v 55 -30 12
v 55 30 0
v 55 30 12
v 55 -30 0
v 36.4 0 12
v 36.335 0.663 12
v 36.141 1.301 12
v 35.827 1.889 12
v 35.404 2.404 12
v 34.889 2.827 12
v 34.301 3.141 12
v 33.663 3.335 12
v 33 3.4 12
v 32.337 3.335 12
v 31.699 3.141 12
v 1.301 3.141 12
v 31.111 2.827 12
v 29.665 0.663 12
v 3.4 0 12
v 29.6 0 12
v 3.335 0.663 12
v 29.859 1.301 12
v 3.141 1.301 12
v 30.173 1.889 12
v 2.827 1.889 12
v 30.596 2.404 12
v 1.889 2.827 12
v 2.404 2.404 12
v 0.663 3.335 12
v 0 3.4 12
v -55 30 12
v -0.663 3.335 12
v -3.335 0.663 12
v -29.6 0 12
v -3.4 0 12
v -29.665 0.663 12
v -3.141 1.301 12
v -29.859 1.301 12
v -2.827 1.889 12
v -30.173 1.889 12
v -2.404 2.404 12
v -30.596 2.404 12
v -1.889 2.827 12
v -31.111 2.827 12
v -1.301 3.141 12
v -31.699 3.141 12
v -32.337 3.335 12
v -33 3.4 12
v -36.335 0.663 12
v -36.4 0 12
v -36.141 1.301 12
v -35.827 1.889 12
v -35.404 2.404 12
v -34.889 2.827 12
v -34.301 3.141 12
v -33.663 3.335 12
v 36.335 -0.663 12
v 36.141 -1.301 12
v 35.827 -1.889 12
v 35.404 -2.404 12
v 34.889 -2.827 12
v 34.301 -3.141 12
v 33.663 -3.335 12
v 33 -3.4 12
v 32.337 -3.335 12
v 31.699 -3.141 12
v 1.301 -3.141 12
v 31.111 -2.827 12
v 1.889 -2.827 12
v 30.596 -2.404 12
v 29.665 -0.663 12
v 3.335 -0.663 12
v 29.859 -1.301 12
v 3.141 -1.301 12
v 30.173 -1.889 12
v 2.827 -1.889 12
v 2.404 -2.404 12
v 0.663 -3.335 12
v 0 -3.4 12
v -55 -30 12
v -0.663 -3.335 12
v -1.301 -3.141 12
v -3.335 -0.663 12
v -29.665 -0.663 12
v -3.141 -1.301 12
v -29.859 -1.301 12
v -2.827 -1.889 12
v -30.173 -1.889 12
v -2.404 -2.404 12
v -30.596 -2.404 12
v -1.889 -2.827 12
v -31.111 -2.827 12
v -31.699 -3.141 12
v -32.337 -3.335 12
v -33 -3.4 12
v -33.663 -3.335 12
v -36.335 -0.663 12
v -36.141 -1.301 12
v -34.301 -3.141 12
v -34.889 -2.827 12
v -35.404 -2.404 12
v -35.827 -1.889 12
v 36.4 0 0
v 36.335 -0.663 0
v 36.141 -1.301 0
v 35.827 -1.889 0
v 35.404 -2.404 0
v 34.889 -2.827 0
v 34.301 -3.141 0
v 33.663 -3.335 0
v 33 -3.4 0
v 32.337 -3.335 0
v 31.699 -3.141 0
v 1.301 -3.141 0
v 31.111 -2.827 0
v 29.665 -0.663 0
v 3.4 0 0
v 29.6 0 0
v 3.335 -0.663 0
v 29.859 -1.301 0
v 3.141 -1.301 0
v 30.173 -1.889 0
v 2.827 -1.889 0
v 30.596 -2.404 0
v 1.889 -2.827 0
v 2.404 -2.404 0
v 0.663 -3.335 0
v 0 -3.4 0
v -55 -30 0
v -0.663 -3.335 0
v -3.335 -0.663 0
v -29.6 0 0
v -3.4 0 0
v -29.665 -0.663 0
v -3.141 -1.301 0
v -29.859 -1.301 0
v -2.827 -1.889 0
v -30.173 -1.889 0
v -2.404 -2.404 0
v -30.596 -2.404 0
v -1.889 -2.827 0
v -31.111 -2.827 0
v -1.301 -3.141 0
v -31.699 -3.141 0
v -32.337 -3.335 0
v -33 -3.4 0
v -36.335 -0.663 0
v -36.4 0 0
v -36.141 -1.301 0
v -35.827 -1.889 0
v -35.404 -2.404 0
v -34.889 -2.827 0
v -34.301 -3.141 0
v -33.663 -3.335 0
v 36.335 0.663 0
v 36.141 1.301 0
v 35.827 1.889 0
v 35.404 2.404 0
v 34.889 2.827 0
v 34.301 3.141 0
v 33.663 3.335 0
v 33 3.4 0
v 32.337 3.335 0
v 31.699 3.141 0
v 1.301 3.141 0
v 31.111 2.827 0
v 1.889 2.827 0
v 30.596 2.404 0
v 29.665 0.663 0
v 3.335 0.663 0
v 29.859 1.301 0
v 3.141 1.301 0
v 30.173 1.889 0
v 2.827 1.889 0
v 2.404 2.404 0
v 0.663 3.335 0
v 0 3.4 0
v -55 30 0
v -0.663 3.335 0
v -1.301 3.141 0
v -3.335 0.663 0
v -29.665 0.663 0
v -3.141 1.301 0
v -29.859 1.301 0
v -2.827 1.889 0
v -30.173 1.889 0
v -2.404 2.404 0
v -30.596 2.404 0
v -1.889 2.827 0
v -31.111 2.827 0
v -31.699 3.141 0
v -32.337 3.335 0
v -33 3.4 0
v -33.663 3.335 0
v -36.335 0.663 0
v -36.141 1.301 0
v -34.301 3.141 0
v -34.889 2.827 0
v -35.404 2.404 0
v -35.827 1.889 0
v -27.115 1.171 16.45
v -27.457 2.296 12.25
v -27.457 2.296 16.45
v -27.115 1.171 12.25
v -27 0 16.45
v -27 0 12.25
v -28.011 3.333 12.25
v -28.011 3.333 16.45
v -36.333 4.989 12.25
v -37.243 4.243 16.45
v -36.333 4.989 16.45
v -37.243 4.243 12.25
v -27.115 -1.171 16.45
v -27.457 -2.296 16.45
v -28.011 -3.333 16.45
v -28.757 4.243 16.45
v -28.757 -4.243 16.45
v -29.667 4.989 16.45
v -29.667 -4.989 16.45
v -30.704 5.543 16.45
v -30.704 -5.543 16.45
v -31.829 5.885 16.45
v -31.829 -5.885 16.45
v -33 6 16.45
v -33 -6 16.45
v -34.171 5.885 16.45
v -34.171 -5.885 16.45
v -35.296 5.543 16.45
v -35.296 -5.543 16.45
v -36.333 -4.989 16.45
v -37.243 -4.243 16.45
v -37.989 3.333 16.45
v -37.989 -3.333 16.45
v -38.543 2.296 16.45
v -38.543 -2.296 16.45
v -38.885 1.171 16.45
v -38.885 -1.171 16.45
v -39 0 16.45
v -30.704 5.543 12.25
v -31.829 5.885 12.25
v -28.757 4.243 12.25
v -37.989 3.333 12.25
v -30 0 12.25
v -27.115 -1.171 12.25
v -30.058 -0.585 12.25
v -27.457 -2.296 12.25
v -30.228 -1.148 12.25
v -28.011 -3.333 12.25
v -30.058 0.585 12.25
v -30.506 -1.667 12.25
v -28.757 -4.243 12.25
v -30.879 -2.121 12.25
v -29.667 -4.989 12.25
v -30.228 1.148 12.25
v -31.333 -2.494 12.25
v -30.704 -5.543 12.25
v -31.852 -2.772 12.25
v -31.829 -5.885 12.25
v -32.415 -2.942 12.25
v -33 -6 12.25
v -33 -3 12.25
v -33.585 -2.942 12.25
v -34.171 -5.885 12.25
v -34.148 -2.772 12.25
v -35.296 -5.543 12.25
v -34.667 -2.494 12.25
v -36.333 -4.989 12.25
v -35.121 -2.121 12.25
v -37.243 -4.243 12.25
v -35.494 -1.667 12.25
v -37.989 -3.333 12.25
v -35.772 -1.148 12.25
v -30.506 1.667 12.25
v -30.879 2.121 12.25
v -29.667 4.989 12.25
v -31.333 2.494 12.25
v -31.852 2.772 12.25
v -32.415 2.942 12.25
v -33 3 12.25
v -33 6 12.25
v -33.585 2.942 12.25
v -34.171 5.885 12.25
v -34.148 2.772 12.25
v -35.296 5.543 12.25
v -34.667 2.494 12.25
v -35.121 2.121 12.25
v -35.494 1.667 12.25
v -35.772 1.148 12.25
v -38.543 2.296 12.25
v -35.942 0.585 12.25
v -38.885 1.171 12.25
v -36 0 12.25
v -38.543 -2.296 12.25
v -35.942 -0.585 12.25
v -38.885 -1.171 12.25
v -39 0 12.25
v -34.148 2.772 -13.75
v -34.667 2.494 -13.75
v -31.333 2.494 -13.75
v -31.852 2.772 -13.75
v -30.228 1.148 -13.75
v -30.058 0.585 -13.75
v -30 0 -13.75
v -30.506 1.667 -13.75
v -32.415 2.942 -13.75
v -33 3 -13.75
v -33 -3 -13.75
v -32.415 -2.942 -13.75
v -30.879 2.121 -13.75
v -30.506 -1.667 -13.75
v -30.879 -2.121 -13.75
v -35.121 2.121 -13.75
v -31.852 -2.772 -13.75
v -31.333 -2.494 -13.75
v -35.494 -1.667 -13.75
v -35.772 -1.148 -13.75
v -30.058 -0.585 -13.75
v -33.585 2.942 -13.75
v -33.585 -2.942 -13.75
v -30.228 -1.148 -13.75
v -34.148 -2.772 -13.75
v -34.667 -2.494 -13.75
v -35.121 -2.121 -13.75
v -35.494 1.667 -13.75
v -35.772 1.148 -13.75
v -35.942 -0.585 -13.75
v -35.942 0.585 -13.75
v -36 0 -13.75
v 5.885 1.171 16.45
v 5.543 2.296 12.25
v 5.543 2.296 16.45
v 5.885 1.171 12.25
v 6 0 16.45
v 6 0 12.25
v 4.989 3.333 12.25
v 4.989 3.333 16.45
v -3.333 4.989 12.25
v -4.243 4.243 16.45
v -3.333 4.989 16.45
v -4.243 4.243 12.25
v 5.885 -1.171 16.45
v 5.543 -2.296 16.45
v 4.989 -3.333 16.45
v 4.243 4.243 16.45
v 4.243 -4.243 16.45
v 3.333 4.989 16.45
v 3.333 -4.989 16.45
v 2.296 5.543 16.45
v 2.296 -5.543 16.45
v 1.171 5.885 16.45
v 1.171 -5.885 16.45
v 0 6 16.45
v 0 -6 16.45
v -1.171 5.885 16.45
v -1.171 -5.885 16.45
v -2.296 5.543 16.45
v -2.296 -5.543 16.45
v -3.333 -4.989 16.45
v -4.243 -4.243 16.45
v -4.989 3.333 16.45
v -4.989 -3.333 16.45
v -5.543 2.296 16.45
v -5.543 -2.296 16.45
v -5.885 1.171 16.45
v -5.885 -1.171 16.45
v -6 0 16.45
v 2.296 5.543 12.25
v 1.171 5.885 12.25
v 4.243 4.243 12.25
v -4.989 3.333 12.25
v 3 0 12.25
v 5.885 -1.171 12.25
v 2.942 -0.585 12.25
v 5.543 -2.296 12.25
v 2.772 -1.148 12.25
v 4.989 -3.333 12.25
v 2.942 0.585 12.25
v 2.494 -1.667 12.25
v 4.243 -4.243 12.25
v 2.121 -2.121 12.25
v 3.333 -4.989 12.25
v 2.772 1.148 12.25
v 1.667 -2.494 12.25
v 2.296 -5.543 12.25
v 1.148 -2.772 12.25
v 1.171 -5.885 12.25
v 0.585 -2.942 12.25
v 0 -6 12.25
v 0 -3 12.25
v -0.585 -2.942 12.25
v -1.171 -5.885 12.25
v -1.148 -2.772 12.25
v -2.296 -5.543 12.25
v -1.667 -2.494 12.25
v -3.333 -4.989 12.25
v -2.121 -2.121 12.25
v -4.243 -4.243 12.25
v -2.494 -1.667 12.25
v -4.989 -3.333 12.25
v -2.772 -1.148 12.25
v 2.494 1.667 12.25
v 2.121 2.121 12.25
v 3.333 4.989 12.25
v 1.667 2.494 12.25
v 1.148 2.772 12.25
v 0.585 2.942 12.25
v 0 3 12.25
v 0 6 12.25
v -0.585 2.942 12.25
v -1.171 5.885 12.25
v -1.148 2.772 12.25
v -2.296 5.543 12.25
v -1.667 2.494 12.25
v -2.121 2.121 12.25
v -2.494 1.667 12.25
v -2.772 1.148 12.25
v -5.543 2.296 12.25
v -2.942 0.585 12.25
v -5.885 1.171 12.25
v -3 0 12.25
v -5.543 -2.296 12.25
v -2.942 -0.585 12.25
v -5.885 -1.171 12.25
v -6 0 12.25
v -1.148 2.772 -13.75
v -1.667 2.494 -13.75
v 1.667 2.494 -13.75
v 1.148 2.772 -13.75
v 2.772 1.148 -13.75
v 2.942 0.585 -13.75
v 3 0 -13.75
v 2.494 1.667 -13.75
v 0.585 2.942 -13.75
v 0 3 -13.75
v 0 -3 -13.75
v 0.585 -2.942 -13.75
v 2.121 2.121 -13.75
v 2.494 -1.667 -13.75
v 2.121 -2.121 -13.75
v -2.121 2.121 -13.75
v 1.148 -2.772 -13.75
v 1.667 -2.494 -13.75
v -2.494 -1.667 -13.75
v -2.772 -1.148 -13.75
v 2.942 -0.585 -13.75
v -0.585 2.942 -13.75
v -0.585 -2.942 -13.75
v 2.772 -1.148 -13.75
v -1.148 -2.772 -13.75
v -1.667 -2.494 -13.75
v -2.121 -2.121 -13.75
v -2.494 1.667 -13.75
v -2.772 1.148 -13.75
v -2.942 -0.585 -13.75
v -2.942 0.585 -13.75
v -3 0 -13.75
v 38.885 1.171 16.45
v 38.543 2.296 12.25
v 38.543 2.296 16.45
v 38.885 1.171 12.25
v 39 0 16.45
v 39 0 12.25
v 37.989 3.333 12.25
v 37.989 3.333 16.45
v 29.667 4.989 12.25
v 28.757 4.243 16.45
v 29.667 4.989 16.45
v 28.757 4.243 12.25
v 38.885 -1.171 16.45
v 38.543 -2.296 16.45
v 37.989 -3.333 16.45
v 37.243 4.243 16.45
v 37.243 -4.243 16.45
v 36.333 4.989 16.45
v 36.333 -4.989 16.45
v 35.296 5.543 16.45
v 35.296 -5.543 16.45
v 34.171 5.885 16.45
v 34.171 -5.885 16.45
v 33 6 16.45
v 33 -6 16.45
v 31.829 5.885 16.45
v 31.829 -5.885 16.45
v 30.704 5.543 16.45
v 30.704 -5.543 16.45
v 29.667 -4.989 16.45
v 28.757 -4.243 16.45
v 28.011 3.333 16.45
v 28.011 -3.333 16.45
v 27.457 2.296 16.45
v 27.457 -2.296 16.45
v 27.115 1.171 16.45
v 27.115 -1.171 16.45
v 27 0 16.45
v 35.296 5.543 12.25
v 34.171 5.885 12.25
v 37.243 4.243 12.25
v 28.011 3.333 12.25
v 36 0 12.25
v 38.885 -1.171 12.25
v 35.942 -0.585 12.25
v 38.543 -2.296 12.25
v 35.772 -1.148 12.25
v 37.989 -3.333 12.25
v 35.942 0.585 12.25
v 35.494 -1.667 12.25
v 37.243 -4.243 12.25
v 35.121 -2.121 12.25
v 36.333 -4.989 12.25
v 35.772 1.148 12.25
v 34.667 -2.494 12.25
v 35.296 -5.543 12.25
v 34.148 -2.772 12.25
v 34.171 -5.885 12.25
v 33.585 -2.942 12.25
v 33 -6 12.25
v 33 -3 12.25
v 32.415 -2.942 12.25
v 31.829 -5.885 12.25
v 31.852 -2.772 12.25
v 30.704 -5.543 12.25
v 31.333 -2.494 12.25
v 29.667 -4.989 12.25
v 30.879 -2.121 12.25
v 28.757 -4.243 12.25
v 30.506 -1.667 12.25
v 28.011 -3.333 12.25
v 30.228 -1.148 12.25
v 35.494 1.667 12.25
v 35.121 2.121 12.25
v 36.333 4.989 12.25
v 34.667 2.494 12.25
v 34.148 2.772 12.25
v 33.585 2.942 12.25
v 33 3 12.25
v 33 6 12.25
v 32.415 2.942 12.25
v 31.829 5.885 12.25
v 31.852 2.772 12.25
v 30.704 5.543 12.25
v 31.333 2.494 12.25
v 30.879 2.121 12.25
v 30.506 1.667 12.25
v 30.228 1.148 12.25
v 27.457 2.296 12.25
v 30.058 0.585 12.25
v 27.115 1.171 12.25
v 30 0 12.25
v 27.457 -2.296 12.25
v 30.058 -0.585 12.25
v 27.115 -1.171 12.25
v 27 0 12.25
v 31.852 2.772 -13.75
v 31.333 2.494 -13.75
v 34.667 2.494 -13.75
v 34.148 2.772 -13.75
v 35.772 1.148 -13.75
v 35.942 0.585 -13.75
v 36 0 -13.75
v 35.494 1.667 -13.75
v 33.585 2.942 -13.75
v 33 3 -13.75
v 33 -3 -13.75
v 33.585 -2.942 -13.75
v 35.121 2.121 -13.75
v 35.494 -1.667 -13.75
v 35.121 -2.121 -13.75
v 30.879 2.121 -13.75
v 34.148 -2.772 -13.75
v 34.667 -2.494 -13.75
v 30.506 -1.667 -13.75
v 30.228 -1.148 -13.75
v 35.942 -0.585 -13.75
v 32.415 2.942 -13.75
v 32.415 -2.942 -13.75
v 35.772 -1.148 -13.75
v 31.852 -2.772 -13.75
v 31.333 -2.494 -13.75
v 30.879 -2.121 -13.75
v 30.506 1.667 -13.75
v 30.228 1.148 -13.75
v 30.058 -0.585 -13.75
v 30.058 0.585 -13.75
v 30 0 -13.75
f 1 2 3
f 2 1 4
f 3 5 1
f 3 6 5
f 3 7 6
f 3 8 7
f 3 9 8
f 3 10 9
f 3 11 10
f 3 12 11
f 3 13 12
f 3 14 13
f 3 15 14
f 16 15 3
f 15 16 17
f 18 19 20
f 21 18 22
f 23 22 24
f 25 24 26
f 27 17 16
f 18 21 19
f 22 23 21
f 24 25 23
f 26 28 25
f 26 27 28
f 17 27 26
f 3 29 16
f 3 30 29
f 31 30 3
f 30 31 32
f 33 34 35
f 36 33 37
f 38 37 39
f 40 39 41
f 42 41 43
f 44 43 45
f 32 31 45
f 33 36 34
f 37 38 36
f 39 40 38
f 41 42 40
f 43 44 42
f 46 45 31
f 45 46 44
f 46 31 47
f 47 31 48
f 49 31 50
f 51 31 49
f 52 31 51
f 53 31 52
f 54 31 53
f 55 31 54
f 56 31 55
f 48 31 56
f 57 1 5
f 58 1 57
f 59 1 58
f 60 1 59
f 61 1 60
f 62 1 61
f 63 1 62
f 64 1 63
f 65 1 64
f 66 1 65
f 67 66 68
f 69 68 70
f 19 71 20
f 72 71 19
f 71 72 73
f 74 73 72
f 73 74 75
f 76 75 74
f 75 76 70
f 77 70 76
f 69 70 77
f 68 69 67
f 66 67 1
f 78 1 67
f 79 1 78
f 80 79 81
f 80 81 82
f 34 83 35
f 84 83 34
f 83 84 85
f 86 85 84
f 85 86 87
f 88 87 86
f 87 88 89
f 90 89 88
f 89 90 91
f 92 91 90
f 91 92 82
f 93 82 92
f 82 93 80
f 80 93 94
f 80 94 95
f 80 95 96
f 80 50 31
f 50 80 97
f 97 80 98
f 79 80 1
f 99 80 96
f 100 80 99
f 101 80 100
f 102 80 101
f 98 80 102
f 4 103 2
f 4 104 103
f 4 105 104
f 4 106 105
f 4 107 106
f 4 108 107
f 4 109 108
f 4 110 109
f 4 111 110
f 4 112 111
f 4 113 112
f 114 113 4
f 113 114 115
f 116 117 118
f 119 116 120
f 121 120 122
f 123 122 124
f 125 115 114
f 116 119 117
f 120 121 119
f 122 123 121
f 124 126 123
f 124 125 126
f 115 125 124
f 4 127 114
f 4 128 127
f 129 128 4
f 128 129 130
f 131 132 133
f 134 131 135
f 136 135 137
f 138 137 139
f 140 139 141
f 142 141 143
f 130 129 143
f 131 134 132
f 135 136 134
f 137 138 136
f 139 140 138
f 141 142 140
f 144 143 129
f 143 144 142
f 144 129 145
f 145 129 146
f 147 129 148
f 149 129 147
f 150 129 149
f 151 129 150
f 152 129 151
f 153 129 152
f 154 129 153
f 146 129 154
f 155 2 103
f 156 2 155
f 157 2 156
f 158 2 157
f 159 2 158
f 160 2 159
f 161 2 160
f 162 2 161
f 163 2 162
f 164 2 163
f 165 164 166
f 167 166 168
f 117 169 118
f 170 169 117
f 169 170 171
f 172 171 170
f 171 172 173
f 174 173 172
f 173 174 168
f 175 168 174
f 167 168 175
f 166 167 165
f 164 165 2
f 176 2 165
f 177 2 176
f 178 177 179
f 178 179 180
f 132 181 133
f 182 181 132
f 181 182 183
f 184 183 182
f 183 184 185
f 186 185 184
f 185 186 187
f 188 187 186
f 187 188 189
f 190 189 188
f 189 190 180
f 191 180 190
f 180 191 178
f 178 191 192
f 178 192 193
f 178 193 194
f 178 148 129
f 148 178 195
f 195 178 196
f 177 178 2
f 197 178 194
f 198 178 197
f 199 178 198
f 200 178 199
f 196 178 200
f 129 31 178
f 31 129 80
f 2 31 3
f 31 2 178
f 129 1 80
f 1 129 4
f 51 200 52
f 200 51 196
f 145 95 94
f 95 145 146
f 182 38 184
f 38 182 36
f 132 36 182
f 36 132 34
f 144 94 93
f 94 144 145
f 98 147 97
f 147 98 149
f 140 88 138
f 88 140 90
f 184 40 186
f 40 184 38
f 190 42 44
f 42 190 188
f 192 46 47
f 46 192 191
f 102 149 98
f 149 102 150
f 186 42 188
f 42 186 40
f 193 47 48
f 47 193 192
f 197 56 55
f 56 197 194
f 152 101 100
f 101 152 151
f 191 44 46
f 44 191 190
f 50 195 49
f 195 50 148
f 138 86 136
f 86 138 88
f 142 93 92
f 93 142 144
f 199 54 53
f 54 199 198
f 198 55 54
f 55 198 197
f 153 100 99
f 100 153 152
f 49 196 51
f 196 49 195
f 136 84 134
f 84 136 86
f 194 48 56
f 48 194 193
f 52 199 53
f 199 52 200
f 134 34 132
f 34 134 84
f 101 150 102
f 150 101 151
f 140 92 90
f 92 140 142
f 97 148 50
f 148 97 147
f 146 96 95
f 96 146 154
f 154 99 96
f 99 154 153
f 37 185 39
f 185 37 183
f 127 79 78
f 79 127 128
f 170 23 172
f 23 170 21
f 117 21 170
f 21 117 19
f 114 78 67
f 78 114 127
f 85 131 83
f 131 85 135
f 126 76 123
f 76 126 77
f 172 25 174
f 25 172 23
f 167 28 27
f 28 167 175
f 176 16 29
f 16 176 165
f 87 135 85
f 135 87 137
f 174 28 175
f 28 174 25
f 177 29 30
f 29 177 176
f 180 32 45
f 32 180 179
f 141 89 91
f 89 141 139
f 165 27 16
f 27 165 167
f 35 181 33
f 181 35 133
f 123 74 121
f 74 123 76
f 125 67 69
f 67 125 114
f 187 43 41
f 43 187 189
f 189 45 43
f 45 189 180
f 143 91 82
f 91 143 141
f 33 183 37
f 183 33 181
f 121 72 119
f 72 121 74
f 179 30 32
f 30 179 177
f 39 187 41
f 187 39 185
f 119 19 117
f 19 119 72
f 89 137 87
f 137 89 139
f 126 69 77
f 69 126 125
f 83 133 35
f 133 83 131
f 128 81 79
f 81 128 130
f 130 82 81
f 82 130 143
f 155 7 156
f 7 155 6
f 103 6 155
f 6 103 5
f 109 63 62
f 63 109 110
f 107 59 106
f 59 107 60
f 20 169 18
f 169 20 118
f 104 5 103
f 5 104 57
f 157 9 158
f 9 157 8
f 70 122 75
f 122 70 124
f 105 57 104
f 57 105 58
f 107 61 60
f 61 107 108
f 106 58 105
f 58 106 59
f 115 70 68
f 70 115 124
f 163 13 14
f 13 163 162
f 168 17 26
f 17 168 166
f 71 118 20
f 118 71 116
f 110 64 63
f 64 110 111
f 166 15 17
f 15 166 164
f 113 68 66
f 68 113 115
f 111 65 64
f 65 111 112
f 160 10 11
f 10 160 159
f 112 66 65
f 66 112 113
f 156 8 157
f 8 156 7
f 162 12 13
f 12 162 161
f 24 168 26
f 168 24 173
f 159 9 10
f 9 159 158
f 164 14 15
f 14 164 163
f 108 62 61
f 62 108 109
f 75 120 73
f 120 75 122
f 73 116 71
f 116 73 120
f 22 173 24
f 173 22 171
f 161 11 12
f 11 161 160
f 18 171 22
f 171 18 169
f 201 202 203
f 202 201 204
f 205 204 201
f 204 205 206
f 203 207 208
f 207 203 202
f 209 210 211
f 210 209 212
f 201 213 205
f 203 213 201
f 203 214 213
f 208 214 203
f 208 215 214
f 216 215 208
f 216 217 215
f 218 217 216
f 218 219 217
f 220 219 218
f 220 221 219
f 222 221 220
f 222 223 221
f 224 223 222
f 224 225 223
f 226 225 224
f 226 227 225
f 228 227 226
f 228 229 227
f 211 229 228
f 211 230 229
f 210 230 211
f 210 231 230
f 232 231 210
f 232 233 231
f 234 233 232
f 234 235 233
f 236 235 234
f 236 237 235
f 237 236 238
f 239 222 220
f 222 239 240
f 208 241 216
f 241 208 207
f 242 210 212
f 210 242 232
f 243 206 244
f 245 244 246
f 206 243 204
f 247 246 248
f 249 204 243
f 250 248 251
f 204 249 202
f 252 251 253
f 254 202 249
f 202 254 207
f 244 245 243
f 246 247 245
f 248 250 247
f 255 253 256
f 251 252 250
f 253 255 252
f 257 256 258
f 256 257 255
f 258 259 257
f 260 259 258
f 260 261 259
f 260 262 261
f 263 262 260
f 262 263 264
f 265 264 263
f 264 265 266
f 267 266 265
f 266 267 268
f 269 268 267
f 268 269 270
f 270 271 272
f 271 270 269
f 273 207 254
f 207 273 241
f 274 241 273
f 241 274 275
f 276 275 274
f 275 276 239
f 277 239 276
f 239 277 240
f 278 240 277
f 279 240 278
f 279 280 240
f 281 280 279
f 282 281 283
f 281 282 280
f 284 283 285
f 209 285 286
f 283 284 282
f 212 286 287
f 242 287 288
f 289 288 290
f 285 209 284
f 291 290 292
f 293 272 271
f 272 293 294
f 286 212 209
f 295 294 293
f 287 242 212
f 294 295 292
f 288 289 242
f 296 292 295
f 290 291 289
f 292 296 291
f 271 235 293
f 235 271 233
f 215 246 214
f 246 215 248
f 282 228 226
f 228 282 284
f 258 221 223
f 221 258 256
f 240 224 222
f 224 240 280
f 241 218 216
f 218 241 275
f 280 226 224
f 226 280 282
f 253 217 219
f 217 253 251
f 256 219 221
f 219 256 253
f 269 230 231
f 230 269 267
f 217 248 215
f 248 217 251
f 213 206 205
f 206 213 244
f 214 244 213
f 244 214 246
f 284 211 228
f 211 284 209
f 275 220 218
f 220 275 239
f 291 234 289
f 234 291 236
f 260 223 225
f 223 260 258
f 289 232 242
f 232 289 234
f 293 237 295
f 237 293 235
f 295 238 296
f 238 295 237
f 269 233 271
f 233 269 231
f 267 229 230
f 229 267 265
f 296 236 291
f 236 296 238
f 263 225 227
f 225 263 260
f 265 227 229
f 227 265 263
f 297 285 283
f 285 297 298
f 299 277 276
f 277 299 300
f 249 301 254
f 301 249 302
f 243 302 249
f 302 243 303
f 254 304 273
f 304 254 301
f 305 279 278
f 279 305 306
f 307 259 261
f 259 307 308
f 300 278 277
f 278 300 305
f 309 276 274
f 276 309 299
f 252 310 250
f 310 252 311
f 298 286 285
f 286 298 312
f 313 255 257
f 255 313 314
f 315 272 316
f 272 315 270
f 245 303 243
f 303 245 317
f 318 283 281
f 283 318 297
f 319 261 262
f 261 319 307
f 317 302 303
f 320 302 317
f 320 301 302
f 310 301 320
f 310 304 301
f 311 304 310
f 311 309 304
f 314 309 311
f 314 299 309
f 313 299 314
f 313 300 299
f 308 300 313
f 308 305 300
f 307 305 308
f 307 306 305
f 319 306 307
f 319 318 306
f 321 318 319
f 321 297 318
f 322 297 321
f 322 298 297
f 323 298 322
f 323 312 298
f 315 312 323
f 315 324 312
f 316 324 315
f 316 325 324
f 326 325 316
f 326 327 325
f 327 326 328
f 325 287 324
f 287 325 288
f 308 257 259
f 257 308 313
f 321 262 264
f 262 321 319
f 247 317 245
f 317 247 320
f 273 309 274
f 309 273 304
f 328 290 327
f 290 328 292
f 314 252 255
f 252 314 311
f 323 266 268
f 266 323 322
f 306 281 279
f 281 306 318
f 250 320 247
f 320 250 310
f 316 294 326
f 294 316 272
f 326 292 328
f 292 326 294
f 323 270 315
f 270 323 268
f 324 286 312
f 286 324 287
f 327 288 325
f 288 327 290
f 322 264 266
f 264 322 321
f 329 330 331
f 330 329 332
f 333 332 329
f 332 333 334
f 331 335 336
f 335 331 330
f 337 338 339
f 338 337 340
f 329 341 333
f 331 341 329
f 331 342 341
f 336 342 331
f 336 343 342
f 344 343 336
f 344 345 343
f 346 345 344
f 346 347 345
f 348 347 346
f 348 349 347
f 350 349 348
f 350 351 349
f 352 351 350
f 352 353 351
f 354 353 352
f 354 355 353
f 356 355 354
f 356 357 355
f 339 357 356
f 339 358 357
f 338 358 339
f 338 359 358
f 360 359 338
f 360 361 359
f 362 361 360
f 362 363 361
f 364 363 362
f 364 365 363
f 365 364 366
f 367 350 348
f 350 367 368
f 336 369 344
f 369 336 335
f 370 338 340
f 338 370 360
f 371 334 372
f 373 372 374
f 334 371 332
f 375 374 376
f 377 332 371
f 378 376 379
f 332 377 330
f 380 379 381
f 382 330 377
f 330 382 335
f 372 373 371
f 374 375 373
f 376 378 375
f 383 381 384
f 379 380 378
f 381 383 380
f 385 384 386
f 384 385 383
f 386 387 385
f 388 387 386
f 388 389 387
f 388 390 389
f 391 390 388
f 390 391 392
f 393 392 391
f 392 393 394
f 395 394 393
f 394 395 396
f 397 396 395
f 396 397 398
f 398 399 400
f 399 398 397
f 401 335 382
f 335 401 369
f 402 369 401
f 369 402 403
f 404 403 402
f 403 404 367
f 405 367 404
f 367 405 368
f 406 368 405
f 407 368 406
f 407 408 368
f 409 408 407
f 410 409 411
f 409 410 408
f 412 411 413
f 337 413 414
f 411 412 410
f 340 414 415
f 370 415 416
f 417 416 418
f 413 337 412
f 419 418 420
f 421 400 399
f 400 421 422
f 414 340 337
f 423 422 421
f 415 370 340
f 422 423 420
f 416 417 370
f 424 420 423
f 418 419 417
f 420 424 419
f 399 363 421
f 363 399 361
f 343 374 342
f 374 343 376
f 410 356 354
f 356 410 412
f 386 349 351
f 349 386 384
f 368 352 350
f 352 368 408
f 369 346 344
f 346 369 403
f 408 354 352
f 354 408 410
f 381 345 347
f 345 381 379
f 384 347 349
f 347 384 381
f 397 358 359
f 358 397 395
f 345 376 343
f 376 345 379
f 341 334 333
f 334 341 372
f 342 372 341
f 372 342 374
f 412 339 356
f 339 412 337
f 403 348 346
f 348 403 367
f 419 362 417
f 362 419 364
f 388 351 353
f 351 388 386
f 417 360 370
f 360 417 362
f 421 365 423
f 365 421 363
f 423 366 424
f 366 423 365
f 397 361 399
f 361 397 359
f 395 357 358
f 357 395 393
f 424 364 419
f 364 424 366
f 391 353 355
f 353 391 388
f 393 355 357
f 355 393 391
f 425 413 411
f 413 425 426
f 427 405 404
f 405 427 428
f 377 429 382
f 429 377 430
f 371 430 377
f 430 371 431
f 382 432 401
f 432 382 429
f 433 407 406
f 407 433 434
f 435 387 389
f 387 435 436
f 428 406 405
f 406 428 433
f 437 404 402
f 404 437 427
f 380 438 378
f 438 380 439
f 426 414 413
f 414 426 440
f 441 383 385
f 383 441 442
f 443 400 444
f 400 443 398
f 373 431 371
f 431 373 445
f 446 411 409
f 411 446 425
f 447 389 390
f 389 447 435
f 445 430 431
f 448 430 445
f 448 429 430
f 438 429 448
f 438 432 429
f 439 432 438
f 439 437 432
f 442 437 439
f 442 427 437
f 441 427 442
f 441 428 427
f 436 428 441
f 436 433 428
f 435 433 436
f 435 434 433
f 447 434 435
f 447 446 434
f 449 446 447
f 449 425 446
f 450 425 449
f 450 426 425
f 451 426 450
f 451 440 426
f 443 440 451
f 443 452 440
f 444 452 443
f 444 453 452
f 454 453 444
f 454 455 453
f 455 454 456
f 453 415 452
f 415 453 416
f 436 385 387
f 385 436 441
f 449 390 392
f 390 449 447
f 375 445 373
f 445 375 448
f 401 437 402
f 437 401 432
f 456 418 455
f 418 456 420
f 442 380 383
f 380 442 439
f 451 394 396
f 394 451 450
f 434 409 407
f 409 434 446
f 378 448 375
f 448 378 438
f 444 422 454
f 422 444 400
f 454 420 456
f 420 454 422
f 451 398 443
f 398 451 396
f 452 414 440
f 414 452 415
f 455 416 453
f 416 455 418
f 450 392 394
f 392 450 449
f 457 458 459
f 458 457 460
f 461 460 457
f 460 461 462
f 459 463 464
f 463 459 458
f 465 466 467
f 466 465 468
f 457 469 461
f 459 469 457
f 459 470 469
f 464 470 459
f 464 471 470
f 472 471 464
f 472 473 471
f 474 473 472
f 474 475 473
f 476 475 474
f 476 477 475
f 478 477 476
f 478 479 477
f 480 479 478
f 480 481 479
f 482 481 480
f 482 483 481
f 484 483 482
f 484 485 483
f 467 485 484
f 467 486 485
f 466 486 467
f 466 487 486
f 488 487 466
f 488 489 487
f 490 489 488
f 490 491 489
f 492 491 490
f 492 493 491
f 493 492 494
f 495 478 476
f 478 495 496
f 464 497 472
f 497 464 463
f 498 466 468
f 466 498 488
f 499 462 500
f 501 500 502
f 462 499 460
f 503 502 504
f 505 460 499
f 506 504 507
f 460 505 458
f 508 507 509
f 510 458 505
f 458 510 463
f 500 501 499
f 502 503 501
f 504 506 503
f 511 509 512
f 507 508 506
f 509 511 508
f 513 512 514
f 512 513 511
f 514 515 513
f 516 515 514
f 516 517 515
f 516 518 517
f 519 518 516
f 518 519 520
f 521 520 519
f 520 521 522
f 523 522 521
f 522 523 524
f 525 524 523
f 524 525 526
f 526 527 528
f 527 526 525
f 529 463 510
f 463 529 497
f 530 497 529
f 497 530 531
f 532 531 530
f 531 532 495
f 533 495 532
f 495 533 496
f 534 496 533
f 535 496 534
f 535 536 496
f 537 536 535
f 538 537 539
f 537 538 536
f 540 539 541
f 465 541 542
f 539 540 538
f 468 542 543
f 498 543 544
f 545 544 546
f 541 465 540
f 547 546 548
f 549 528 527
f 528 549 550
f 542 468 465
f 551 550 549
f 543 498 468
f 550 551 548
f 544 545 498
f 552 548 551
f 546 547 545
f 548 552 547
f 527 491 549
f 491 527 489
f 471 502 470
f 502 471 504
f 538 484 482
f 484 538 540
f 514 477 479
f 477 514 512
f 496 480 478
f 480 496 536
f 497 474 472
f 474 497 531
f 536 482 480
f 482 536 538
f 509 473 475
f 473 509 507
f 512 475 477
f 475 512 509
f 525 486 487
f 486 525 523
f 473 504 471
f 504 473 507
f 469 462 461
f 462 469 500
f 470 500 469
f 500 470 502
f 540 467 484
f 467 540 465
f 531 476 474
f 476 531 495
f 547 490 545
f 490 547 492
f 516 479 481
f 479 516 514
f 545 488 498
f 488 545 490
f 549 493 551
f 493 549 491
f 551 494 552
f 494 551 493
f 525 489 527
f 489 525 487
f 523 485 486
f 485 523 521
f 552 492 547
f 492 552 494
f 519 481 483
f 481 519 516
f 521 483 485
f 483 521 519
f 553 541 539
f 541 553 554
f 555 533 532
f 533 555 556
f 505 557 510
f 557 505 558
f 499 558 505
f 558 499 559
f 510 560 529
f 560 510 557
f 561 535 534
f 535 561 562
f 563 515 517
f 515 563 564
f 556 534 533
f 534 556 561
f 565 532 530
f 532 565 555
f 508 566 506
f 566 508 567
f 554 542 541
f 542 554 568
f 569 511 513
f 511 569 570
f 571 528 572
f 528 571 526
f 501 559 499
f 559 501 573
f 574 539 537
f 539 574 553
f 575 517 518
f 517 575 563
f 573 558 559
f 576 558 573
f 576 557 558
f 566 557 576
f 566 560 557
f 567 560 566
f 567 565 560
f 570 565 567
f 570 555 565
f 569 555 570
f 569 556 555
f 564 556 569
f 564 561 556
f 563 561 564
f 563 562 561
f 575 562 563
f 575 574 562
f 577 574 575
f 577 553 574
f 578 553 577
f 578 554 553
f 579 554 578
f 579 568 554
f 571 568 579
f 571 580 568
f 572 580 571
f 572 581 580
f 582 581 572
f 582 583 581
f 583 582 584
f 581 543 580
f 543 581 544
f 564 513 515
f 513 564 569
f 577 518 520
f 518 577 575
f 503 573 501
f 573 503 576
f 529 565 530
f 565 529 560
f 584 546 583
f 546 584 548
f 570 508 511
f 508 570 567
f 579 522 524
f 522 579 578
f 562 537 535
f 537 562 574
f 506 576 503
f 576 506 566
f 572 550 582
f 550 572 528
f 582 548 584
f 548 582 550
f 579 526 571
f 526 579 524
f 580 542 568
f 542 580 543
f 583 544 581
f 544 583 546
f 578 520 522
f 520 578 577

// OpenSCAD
$fn = 32;

// ------------------------------------------------------------------------
// Bolted plate: 110 x 60 x 12 mm plate, 3 fasteners
// Every part is its own module, assembly() places them once.
// ------------------------------------------------------------------------

// --- part 1 ---
module plate() {
  difference() {
    translate([-55, -30, 0]) cube([110, 60, 12]);
    translate([-33, 0, -1]) cylinder(h = 14, d = 6.8);
    translate([0, 0, -1]) cylinder(h = 14, d = 6.8);
    translate([33, 0, -1]) cylinder(h = 14, d = 6.8);
  }
}

// --- part 2 ---
module bolt1() {
  cylinder(h = 4.2, d = 12);
  translate([0, 0, -26]) cylinder(h = 26, d = 6);
}

// --- part 3 ---
module bolt2() {
  cylinder(h = 4.2, d = 12);
  translate([0, 0, -26]) cylinder(h = 26, d = 6);
}

// --- part 4 ---
module bolt3() {
  cylinder(h = 4.2, d = 12);
  translate([0, 0, -26]) cylinder(h = 26, d = 6);
}

// --- assembly ---
module assembly() {
  translate([0, 0, 0]) rotate([0, 0, 0]) plate();
  translate([-33, 0, 12.25]) rotate([0, 0, 0]) bolt1();
  translate([0, 0, 12.25]) rotate([0, 0, 0]) bolt2();
  translate([33, 0, 12.25]) rotate([0, 0, 0]) bolt3();
}

assembly();
